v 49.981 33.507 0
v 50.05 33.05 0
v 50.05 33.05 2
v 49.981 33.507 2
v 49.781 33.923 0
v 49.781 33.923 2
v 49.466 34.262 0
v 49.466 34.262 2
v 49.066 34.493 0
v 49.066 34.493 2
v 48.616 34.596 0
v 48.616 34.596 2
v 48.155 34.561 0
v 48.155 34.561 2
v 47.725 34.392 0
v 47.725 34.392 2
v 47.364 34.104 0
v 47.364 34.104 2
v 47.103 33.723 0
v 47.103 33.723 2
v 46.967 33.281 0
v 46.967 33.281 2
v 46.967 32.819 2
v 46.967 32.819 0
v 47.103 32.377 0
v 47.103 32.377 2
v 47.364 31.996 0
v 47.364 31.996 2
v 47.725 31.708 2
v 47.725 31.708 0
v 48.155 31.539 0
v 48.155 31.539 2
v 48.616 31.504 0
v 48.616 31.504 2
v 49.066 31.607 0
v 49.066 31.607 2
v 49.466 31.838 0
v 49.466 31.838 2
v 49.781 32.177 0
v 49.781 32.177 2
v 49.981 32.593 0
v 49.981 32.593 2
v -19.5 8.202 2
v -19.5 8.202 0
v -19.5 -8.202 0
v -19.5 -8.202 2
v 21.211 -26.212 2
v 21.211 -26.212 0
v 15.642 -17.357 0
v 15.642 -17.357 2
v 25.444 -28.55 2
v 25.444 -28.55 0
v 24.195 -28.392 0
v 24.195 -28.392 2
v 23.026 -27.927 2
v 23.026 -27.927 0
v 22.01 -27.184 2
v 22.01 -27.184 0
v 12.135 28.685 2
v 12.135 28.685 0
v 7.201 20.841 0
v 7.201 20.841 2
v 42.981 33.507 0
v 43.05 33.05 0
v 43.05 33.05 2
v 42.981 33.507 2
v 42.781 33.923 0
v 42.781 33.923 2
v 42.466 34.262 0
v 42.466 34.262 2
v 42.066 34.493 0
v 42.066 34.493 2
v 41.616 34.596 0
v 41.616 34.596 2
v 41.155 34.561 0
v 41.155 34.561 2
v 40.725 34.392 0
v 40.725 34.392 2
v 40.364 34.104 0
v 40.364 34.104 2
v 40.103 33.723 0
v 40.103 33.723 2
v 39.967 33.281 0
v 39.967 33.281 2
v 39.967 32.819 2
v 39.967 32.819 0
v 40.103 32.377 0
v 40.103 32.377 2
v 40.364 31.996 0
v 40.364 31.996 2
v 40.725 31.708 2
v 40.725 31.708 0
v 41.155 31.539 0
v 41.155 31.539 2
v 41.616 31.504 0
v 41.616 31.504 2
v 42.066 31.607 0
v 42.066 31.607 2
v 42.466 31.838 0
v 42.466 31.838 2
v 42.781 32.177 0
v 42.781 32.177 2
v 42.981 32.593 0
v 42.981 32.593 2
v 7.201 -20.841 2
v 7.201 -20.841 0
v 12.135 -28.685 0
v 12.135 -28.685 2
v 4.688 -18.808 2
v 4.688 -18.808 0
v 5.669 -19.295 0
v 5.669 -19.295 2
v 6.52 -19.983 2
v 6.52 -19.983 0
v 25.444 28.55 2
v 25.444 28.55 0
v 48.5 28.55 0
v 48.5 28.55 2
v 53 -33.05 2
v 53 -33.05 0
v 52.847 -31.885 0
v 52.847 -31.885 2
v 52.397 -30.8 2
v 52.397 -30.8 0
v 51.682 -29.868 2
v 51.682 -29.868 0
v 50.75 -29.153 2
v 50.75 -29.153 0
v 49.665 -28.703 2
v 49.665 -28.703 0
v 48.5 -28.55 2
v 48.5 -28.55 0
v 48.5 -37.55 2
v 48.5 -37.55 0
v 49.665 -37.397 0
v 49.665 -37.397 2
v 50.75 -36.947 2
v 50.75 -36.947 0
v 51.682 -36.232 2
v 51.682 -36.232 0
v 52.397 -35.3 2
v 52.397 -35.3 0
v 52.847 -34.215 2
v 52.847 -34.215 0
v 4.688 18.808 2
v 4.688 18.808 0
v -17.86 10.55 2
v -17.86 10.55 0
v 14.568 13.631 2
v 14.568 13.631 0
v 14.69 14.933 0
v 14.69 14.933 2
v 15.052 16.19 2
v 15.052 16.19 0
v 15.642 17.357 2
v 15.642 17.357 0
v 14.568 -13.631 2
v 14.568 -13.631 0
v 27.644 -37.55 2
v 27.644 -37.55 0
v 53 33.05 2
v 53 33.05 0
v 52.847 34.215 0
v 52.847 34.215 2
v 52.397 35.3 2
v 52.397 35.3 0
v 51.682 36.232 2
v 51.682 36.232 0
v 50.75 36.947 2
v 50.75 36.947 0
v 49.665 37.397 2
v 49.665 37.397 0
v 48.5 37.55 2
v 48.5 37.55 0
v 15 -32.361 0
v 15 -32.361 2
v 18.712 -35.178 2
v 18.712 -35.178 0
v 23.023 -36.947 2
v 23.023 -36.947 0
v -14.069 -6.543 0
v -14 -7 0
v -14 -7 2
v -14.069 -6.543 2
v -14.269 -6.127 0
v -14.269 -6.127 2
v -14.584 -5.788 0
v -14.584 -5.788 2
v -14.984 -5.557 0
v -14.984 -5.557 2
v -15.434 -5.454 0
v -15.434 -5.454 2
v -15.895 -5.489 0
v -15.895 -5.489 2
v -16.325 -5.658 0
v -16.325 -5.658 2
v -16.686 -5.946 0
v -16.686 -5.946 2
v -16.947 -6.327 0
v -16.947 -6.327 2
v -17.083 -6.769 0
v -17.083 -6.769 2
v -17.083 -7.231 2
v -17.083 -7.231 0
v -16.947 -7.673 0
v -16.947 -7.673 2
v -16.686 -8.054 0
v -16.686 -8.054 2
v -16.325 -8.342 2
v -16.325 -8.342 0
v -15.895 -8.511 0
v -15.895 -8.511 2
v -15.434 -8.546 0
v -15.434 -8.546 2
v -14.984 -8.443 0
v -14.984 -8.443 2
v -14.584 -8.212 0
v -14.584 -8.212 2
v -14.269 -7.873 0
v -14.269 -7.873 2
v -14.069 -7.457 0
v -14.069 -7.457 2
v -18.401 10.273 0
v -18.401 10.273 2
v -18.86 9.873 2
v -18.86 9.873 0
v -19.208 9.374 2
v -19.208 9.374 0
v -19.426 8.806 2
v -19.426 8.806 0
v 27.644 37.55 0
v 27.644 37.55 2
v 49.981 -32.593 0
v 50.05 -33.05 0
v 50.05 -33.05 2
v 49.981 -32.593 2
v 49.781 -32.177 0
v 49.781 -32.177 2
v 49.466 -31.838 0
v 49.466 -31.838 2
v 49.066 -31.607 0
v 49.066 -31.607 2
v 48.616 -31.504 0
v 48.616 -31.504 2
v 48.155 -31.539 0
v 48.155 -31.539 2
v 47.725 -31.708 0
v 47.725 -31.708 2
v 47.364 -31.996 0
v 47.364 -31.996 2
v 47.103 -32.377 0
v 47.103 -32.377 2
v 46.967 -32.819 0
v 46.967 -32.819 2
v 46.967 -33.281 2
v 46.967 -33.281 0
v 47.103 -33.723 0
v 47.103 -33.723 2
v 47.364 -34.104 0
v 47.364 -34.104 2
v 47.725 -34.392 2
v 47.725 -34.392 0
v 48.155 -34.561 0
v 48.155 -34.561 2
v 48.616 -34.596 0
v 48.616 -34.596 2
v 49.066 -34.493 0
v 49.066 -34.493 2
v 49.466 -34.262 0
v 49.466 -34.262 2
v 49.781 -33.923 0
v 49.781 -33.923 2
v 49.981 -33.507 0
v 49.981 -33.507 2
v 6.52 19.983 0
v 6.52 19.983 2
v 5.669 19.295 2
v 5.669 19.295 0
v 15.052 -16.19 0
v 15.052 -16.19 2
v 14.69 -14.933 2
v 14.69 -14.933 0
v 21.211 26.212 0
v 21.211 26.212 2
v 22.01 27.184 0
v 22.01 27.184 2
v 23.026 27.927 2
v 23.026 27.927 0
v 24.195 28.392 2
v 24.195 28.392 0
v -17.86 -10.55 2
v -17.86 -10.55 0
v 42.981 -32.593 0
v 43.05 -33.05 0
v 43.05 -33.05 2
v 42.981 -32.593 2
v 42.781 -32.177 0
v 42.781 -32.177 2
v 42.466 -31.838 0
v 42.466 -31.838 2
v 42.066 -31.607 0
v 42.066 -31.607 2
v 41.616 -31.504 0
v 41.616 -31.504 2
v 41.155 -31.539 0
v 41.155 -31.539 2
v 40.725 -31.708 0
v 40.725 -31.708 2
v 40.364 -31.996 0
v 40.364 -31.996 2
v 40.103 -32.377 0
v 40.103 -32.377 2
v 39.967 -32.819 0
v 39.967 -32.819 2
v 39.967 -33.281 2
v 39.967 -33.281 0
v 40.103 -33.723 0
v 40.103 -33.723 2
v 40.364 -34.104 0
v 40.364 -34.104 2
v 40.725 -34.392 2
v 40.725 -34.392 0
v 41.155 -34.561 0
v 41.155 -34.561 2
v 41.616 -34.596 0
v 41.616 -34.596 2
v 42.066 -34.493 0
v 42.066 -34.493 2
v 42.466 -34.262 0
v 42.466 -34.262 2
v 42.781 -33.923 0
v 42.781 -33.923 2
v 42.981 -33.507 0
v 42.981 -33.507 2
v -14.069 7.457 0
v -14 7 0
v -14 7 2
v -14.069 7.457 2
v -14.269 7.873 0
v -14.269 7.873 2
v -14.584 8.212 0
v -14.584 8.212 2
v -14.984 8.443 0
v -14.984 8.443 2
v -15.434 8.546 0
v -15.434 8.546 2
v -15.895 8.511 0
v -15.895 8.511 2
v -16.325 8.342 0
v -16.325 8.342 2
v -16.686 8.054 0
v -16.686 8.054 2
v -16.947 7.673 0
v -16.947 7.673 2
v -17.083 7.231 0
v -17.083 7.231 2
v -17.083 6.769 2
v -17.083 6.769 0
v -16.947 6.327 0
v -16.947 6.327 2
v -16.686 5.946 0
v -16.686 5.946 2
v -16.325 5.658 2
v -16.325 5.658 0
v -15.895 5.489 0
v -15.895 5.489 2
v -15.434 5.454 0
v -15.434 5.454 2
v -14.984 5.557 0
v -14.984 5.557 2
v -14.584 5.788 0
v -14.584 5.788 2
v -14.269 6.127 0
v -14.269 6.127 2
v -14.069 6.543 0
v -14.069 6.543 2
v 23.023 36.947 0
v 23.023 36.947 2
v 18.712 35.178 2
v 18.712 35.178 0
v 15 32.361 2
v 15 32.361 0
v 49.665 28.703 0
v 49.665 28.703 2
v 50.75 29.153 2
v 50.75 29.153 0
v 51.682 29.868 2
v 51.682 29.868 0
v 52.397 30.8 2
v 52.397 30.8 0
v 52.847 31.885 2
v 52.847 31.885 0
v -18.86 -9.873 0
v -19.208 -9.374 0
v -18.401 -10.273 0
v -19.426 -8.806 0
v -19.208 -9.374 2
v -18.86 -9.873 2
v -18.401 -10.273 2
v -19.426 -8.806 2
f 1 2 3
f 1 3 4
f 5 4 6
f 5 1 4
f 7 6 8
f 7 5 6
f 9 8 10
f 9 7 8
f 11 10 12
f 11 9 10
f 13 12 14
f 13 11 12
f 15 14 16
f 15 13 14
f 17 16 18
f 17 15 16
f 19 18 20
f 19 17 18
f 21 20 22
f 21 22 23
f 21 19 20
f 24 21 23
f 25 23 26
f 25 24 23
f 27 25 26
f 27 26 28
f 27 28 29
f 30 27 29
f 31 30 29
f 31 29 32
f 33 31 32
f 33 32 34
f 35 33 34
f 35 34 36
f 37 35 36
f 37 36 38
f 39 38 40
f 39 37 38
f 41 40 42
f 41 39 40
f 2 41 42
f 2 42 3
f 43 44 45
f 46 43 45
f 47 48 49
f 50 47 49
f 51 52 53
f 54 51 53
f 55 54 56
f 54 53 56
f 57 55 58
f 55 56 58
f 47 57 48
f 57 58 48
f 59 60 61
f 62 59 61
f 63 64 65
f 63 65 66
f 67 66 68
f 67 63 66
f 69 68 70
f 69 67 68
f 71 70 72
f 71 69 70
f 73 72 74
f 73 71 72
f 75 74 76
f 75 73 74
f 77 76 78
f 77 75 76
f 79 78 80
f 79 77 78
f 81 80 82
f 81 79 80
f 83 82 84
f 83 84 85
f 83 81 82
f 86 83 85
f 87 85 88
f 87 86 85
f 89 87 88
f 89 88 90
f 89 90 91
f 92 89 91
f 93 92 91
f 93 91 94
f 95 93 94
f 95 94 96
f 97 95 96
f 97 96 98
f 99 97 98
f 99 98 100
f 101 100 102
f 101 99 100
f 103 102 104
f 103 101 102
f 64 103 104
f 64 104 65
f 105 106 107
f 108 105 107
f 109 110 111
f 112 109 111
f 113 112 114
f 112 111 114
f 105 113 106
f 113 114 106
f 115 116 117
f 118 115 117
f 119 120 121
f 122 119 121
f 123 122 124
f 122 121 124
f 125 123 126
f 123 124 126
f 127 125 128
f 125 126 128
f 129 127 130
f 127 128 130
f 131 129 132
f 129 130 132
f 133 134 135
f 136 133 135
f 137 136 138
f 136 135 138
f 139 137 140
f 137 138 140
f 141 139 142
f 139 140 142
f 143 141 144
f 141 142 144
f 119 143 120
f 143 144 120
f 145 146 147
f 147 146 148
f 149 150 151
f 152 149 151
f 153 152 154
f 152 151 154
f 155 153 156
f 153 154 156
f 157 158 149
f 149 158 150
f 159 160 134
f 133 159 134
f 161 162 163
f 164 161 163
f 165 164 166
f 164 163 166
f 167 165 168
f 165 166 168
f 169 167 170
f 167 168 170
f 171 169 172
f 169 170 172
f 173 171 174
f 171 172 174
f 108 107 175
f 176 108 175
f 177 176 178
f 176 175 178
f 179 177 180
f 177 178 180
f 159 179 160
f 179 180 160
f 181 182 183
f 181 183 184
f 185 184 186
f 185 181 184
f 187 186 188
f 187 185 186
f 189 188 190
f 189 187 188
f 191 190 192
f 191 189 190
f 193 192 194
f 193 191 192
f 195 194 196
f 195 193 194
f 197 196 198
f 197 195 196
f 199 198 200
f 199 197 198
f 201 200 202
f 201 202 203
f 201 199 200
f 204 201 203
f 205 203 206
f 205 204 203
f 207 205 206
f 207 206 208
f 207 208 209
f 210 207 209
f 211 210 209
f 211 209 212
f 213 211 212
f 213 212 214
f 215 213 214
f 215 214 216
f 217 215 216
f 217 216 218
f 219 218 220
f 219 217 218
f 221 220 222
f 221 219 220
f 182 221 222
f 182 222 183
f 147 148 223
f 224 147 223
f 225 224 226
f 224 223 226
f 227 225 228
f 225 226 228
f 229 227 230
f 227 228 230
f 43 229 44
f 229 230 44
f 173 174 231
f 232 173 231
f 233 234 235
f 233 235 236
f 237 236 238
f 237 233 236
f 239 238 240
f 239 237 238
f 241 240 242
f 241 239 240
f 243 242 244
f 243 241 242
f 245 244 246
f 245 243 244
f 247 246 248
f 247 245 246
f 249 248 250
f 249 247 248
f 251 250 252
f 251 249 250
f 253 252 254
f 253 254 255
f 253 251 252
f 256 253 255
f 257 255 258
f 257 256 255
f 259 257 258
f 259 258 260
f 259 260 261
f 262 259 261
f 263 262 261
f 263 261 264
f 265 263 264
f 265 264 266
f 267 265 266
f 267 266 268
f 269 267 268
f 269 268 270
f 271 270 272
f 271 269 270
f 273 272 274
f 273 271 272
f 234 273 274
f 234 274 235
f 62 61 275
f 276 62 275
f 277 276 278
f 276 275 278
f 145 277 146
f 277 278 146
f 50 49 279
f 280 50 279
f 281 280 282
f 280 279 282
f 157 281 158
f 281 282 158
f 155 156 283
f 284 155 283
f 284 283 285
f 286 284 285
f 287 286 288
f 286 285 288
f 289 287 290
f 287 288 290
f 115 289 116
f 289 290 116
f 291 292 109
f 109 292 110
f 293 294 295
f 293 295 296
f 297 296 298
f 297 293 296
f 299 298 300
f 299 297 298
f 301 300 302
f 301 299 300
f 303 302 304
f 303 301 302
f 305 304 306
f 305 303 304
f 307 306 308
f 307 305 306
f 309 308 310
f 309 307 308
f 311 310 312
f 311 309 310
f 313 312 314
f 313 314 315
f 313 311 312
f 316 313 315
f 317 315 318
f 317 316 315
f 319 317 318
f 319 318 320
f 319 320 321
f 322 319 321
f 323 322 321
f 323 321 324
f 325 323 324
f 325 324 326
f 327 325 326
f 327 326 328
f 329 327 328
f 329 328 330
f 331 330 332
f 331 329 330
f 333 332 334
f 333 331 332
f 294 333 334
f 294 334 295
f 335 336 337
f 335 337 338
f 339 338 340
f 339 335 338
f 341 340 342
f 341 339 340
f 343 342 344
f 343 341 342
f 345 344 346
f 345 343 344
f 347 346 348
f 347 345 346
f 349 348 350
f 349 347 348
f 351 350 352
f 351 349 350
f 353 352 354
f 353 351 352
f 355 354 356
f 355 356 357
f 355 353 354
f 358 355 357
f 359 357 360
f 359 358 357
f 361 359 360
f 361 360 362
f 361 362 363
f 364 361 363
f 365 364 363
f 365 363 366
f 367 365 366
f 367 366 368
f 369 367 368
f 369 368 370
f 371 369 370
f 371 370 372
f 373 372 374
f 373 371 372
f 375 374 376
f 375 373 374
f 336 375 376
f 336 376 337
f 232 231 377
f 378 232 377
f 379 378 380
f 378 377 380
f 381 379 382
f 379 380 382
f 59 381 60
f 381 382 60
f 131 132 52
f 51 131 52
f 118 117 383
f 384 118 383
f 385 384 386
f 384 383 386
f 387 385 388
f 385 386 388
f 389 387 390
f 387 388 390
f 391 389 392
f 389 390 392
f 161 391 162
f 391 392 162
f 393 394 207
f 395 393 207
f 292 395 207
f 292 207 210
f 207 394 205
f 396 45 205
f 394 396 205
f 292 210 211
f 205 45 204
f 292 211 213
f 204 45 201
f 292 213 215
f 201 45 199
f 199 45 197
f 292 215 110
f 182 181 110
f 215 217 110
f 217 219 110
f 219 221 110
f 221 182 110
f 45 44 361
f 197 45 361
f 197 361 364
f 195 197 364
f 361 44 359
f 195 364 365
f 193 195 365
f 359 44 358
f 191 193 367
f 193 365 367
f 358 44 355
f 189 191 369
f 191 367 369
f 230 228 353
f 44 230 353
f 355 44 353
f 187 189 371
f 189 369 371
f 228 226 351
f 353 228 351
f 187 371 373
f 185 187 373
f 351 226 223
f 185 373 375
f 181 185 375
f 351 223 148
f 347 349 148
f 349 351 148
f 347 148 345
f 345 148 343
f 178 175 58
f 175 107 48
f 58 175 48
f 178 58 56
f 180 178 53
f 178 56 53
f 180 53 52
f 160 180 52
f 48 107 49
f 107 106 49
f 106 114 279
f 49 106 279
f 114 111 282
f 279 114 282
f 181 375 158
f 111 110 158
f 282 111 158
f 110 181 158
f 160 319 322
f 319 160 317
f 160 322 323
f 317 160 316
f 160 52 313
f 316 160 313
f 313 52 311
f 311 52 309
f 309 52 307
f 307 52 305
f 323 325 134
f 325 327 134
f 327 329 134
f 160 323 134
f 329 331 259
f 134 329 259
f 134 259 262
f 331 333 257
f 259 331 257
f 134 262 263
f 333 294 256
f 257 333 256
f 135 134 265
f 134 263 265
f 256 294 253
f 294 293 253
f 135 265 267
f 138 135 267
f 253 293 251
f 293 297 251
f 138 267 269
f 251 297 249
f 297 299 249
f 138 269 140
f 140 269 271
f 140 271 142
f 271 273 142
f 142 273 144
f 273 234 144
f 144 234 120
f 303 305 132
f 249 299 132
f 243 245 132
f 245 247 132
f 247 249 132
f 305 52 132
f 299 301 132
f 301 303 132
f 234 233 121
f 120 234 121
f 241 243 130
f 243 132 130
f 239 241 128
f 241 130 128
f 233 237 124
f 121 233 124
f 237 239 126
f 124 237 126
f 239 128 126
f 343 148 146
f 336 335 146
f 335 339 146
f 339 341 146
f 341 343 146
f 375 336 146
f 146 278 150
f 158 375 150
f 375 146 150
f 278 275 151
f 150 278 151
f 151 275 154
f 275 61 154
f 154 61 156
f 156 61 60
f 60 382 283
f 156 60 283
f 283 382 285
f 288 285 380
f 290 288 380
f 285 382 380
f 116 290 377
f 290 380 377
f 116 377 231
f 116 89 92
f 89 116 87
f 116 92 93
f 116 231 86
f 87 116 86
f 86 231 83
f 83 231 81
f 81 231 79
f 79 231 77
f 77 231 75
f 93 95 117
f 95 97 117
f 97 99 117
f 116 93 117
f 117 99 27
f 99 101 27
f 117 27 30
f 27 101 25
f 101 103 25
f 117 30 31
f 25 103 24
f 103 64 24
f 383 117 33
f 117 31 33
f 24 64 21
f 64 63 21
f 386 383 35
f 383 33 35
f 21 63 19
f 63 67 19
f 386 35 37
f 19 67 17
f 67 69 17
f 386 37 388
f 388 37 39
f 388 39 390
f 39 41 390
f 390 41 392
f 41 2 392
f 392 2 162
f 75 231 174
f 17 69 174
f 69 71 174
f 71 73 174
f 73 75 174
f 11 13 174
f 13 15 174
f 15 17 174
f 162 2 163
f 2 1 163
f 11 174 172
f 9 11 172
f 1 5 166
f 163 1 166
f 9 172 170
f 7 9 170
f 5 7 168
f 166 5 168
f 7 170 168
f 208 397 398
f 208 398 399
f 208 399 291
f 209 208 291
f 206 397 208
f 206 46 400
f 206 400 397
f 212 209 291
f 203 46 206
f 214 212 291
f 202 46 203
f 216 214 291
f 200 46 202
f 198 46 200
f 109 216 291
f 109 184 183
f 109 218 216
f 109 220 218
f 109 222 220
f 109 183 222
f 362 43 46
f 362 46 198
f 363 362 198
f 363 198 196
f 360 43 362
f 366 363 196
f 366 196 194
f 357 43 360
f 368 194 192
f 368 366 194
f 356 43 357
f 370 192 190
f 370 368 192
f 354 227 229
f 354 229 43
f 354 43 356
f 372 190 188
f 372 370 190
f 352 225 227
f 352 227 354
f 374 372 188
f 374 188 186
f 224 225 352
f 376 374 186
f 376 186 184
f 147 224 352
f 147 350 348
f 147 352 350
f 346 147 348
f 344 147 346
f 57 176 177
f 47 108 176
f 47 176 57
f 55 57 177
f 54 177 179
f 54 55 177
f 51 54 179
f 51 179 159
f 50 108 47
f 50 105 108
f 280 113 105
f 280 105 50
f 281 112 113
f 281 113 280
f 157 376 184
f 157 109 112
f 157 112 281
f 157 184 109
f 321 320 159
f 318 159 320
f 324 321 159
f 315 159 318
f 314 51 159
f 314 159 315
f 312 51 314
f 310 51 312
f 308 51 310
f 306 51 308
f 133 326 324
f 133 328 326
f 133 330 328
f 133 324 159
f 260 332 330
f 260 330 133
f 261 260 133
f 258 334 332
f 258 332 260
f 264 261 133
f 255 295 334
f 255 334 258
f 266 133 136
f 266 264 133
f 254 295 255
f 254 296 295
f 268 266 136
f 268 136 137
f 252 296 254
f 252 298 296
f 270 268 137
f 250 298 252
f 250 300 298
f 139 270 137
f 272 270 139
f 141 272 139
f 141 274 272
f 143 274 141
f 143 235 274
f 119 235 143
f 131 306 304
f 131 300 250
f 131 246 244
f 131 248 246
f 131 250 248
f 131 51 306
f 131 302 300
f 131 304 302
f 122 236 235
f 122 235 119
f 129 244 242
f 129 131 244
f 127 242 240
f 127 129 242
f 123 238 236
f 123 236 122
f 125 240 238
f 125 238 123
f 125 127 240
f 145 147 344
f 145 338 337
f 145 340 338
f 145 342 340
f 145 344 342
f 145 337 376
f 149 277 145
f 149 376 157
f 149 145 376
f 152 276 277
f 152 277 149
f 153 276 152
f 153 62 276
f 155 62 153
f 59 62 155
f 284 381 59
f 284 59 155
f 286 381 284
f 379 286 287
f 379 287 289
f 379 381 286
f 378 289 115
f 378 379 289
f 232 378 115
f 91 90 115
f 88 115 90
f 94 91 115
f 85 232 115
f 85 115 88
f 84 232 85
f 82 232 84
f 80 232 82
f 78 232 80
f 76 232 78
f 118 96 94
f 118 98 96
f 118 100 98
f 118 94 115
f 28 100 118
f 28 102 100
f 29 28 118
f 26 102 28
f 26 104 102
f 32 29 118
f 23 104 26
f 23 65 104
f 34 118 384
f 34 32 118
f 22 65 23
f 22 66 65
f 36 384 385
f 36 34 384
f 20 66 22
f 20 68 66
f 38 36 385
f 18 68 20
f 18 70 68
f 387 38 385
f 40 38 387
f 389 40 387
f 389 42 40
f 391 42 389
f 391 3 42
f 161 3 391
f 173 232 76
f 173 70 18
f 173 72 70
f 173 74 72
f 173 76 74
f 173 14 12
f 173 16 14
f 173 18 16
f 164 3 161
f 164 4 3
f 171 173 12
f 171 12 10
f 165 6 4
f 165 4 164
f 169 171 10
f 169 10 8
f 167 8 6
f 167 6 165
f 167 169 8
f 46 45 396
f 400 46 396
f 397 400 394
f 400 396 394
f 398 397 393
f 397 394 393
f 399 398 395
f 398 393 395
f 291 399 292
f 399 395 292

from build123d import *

# Parameters (mm, degrees)
F0_R     = 1.55
F1_DEPTH = 2


# Not quite as in the source:
# - a feature names something its author has since deleted; it is built from what else it names


with BuildPart() as f1:
    # F0 (on Top) → F1 (new body)
    with BuildSketch(Plane.XY):
        with BuildLine():
            Line((25.4436091884, 28.55), (48.5000015985, 28.55))
            ThreePointArc((48.5000015985, 28.55), (51.6819821139, 29.8680194847), (53.0000015985, 33.05))
            ThreePointArc((53.0000015985, 33.05), (51.6819821139, 36.2319805153), (48.5000015985, 37.55))
            Line((48.5000015985, 37.55), (27.6442359668, 37.55))
            ThreePointArc((27.6442359668, 37.55), (18.7122132684, 35.1775068554), (12.1347641944, 28.6854411684))
            Line((12.1347641944, 28.6854411684), (7.2011388972, 20.8408842798))
            ThreePointArc((7.2011388972, 20.8408842798), (6.1134719977, 19.6156574256), (4.6881494145, 18.8077863577))
            Line((4.6881494145, 18.8077863577), (-17.8597609739, 10.5497599571))
            ThreePointArc((-17.8597609739, 10.5497599571), (-19.0493172564, 9.6341347233), (-19.5, 8.2022482814))
            Line((-19.5, 8.2022482814), (-19.5, -8.2022482814))
            ThreePointArc((-19.5, -8.2022482814), (-19.0493172564, -9.6341347233), (-17.8597609739, -10.5497599571))
            Line((-17.8597609739, -10.5497599571), (4.6881494145, -18.8077863577))
            ThreePointArc((4.6881494145, -18.8077863577), (6.1134719977, -19.6156574256), (7.2011388972, -20.8408842798))
            Line((7.2011388972, -20.8408842798), (12.1347641944, -28.6854411684))
            ThreePointArc((12.1347641944, -28.6854411684), (18.7122132684, -35.1775068554), (27.6442359668, -37.55))
            Line((27.6442359668, -37.55), (48.5000015985, -37.55))
            ThreePointArc((48.5000015985, -37.55), (51.6819821139, -36.2319805153), (53.0000015985, -33.05))
            ThreePointArc((53.0000015985, -33.05), (51.6819821139, -29.8680194847), (48.5000015985, -28.55))
            Line((48.5000015985, -28.55), (25.4436091884, -28.55))
            ThreePointArc((25.4436091884, -28.55), (23.0259271525, -27.9266212509), (21.211097758, -26.2119254294))
            Line((21.211097758, -26.2119254294), (15.6422879472, -17.3574132338))
            ThreePointArc((15.6422879472, -17.3574132338), (14.8417868513, -15.5699685166), (14.5678039498, -13.6307176327))
            Line((14.5678039498, -13.6307176327), (14.5678039498, 13.6307176327))
            ThreePointArc((14.5678039498, 13.6307176327), (14.8417868513, 15.5699685166), (15.6422879472, 17.3574132338))
            Line((15.6422879472, 17.3574132338), (21.211097758, 26.2119254294))
            ThreePointArc((21.211097758, 26.2119254294), (23.0259271525, 27.9266212509), (25.4436091884, 28.55))
        make_face()
        with Locations((-15.55, -7)):
            Circle(F0_R, mode=Mode.SUBTRACT)
        with Locations((41.5000015985, -33.05)):
            Circle(F0_R, mode=Mode.SUBTRACT)
        with Locations((48.5000015985, -33.05)):
            Circle(F0_R, mode=Mode.SUBTRACT)
        with Locations((-15.55, 7)):
            Circle(F0_R, mode=Mode.SUBTRACT)
        with Locations((41.5000015985, 33.05)):
            Circle(F0_R, mode=Mode.SUBTRACT)
        with Locations((48.5000015985, 33.05)):
            Circle(F0_R, mode=Mode.SUBTRACT)
    extrude(amount=F1_DEPTH)


solid = f1.part
